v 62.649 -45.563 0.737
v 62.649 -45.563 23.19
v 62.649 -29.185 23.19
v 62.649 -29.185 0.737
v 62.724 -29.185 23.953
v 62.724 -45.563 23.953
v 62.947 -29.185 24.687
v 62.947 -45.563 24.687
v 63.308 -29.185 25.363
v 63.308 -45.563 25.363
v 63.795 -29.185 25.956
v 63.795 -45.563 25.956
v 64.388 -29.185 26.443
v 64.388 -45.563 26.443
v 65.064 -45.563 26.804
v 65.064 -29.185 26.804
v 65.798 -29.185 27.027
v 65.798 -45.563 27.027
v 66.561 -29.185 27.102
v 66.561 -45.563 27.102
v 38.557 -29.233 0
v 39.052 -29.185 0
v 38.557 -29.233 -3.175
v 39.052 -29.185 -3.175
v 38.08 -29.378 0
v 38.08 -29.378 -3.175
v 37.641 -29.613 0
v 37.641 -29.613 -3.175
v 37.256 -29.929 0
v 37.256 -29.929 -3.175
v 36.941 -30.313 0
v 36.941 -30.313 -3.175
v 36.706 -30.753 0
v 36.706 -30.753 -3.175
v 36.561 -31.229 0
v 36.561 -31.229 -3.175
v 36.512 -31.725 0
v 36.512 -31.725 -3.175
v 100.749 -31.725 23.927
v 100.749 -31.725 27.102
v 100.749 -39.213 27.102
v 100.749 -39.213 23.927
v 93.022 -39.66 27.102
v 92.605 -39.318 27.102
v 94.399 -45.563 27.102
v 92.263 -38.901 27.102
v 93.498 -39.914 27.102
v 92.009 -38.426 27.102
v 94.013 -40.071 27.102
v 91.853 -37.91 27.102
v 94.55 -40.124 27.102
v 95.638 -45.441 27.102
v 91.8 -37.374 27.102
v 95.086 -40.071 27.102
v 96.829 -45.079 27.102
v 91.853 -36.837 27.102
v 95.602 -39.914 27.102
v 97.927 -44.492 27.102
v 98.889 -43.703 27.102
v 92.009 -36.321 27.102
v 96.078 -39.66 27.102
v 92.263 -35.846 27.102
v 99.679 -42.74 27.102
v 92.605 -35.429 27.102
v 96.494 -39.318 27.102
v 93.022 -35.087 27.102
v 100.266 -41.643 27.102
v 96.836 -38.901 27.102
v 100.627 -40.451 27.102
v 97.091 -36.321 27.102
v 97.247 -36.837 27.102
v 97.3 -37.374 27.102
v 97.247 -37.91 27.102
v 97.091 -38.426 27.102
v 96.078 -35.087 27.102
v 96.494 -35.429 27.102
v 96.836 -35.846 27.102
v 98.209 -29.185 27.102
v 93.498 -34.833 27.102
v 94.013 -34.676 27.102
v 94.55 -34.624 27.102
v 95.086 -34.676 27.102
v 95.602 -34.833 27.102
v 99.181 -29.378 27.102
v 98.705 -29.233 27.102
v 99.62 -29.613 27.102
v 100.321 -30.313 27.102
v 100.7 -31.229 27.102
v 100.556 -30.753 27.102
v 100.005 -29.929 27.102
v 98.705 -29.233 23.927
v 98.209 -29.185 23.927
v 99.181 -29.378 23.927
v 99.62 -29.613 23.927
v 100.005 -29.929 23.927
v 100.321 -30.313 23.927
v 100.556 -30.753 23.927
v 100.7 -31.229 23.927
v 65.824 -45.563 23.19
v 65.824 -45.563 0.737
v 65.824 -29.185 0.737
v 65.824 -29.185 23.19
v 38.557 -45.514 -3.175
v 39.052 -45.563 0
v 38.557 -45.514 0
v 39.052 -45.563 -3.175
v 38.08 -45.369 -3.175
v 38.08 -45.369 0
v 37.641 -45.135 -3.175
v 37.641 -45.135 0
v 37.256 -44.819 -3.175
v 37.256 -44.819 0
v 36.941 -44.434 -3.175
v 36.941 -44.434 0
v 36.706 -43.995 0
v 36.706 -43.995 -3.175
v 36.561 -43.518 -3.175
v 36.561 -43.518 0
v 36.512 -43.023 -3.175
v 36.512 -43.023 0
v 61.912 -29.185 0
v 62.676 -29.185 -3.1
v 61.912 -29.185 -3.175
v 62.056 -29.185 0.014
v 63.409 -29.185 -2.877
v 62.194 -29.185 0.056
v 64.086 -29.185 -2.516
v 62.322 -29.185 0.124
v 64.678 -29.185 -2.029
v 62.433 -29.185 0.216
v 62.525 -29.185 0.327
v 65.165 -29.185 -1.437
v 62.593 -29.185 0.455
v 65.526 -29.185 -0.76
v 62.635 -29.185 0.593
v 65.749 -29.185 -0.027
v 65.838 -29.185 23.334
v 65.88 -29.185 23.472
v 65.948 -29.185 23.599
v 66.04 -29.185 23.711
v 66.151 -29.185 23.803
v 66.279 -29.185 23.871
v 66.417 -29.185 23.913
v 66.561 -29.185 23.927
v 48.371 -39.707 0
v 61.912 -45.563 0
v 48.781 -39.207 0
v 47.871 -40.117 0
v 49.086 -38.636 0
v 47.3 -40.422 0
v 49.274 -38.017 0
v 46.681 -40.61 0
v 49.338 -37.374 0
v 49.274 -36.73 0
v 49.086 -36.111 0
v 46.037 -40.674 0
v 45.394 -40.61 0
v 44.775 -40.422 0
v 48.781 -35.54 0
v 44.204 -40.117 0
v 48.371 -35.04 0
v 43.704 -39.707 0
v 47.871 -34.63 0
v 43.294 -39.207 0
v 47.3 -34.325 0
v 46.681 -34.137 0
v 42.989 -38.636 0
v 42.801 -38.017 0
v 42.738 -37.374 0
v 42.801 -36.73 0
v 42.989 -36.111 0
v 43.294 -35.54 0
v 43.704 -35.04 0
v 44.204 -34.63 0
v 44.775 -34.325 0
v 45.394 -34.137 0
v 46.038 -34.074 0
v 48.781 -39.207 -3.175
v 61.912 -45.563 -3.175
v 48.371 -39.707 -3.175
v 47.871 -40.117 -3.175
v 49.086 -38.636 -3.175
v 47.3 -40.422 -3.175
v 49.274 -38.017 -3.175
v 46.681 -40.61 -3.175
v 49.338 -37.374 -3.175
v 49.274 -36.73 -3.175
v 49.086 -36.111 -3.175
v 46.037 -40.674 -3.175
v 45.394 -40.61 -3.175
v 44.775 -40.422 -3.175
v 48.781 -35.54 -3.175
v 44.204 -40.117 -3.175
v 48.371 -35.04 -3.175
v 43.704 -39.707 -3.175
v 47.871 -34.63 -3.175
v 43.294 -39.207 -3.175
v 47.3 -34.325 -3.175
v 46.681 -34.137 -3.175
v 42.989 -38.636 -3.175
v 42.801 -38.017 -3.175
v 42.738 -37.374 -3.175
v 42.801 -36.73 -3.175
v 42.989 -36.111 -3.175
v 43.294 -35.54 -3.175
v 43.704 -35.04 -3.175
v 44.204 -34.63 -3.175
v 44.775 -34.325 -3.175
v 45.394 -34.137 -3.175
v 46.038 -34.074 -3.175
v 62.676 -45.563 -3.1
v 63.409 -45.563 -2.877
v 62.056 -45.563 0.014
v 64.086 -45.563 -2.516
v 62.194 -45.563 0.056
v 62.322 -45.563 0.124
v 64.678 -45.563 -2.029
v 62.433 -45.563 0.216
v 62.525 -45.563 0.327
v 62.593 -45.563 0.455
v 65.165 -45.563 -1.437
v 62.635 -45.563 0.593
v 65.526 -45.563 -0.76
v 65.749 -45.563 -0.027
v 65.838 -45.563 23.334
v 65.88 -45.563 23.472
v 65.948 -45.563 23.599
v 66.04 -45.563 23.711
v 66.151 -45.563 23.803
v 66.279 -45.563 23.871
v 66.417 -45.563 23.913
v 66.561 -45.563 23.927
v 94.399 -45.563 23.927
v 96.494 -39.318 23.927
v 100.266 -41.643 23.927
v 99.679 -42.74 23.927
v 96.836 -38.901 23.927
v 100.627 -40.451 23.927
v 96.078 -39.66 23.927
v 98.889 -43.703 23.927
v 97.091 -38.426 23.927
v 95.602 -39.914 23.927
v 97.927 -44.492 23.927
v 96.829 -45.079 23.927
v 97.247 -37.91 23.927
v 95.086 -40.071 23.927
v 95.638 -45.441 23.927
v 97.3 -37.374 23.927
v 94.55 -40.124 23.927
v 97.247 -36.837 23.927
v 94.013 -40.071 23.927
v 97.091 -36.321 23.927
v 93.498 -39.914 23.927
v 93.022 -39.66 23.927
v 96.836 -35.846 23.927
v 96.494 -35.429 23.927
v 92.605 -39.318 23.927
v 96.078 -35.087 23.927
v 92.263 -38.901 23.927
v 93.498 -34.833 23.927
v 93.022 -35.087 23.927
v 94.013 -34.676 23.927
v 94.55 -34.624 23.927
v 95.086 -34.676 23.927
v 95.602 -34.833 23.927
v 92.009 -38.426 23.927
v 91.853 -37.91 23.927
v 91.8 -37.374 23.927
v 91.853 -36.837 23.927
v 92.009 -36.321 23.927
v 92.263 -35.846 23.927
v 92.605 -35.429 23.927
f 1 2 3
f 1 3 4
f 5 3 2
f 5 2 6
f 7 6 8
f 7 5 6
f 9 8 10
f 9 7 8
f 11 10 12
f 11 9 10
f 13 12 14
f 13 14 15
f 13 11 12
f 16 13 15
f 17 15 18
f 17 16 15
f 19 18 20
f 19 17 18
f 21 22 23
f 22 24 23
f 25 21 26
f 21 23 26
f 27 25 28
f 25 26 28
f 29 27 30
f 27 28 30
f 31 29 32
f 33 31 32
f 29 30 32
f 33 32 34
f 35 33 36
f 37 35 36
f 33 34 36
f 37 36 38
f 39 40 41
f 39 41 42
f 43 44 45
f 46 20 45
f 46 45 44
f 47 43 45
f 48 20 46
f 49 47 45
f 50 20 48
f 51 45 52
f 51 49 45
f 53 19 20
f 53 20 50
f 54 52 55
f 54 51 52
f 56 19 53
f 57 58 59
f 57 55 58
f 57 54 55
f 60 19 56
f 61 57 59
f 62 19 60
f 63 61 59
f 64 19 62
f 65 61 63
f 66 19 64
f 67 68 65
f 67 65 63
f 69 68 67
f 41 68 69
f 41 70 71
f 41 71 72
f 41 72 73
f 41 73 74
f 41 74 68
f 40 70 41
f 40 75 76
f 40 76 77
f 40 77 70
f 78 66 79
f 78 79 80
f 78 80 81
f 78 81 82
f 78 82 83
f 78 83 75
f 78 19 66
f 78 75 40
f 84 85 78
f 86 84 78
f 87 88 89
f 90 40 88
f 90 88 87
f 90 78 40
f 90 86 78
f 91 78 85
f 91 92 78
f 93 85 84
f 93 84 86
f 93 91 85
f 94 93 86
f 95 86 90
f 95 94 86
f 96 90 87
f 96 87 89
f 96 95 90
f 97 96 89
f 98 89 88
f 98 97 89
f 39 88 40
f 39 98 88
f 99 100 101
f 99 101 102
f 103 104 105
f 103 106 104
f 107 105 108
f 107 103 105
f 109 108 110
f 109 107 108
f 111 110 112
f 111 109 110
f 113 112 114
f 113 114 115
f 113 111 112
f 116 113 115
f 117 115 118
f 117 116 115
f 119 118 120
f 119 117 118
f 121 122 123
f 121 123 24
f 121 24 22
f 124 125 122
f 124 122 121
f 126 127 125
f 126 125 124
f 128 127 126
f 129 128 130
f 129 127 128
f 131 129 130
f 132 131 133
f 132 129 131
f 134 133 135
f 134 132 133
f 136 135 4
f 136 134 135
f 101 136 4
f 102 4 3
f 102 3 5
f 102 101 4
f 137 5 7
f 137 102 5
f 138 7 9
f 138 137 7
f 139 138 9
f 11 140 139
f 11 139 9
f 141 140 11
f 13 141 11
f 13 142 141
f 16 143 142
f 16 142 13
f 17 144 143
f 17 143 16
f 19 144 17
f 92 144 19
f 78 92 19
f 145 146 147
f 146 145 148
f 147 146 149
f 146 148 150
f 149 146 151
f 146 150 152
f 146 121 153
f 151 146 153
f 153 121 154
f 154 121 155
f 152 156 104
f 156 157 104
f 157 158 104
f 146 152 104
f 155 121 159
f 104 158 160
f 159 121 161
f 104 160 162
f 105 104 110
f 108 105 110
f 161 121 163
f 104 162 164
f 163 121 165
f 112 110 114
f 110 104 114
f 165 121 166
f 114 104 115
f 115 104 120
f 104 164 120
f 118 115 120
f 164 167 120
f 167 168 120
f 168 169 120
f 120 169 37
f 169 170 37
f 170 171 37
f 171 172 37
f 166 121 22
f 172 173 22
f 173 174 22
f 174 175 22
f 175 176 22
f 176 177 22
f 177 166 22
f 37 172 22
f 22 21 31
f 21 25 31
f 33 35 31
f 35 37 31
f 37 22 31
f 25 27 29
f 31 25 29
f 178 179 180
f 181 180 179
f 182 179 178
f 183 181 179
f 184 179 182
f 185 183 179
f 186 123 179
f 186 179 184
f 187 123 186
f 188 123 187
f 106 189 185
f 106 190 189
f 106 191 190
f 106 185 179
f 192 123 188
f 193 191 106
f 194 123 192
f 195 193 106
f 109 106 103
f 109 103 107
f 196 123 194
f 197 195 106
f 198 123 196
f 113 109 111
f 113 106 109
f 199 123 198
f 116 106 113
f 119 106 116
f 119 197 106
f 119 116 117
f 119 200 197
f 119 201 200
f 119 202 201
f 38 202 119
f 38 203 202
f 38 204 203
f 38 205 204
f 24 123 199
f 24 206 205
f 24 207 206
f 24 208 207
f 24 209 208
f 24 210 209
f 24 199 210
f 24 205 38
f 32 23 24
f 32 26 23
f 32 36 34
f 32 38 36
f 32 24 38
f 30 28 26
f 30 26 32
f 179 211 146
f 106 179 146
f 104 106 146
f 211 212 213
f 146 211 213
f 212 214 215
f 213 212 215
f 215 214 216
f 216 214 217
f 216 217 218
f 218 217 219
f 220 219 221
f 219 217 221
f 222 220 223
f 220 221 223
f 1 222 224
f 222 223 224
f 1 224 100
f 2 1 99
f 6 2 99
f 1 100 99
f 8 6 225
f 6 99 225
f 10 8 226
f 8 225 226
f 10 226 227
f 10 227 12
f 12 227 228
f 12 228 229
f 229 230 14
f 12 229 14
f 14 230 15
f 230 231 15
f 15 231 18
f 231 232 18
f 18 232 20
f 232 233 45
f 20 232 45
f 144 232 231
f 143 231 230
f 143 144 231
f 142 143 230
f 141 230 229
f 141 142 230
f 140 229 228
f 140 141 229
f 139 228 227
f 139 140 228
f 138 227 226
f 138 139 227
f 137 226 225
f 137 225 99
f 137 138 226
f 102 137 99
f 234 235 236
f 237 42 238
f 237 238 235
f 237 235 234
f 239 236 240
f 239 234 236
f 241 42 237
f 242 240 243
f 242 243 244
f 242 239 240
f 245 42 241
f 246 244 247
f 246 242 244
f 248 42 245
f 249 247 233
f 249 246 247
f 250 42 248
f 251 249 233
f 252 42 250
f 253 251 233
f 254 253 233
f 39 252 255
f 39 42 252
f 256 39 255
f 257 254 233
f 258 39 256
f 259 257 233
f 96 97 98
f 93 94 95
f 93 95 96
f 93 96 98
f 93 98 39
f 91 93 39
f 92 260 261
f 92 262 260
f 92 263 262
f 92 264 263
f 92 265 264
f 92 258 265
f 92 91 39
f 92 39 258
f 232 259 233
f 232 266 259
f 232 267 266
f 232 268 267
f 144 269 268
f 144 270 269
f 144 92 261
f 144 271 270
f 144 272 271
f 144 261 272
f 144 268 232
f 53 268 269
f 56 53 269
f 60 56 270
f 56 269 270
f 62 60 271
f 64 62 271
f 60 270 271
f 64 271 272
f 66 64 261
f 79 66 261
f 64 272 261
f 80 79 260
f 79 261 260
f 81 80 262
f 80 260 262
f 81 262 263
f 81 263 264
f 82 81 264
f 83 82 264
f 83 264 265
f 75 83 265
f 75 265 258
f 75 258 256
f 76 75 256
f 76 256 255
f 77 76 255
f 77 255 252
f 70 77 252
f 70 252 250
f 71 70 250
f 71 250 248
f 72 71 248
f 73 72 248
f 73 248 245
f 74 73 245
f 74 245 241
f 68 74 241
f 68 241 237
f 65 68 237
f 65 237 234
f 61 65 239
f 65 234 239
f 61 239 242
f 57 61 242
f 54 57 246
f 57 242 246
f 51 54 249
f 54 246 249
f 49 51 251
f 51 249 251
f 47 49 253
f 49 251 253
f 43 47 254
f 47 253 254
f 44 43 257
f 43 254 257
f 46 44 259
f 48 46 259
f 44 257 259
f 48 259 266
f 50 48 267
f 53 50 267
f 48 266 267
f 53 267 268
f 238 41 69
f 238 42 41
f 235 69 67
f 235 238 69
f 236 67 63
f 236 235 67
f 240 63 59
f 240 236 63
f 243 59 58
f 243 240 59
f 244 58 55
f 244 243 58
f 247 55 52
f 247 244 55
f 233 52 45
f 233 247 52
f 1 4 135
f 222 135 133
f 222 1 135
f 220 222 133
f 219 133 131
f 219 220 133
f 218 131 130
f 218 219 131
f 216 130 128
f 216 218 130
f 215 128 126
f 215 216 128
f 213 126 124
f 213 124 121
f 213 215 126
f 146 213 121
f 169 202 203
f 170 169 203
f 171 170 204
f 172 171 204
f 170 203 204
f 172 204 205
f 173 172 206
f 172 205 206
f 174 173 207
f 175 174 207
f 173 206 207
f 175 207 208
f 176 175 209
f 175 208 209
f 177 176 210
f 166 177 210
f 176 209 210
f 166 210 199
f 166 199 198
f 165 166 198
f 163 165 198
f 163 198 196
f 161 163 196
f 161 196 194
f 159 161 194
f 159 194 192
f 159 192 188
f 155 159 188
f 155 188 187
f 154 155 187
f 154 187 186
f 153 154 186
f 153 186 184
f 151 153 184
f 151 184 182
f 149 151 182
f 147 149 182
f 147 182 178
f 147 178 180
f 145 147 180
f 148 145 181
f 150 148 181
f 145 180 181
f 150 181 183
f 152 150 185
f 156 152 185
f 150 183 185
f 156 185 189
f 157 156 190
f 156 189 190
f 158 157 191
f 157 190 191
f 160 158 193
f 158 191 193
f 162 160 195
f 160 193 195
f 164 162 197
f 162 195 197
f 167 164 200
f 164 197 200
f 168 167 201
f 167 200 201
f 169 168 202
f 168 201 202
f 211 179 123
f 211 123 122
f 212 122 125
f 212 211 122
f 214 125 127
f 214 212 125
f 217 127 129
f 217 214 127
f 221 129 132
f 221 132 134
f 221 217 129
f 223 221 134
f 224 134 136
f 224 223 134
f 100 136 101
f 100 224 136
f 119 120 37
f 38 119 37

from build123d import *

# Parameters (mm, degrees)
BASE_FLANGE1_DEPTH           = 3.175
M6_CLEARANCE_HOLE1_D         = 6.6
EDGE_FLANGE1_DEPTH           = 16.378
EDGE_FLANGE2_STRIP_W         = 14.1732
EDGE_FLANGE2_STRIP_H         = 3.175
EDGE_FLANGE2_STRIP_CUT_DEPTH = 16.378
EDGE_FLANGE2_DEPTH           = 16.378
M5_CLEARANCE_HOLE1_D         = 5.5
FILLET1_R                    = 2.54
FILLET2_R                    = 6.35


# Sheet-metal steps are written as plain solids
with BuildPart() as part:
    # Sketch1 → Base-Flange1 (new body)
    with BuildSketch(Plane.XY):
        Polygon((52.8905, -45.562600001), (36.5125, -45.562600001), (36.5125, -29.184600001), (61.9125, -29.184600001), (61.9125, -45.562600001), align=None)
    extrude(amount=-BASE_FLANGE1_DEPTH)

    # M6 Clearance Hole1 (through all)
    with Locations(Plane.XY):
        with Locations((46.0375, -37.373600001)):
            Hole(M6_CLEARANCE_HOLE1_D / 2)

    # Edge-Flange1 section (across the edge) → Edge-Flange1 (add)
    with BuildSketch(Plane(origin=(62.6491, -45.562600001, 0), x_dir=(-1, 0, 0), z_dir=(0, 1, 0))):
        with BuildLine():
            Line((-3.175, 0.7366), (-3.175, 23.9268))
            Line((-3.175, 23.9268), (0, 23.9268))
            Line((0, 23.9268), (0, 0.7366))
            ThreePointArc((0, 0.7366), (0.215745145, 0.215745145), (0.7366, 0))
            Line((0.7366, 0), (0.7366, -3.175))
            ThreePointArc((0.7366, -3.175), (-2.029318885, -2.029318885), (-3.175, 0.7366))
        make_face()
    extrude(amount=EDGE_FLANGE1_DEPTH)

    # Edge-Flange2 strip (across the edge) → Edge-Flange2 strip cut (cut)
    with BuildSketch(Plane(origin=(65.8241, -29.184600001, 23.9268), x_dir=(0, 0, -1), z_dir=(0, -1, 0))):
        with Locations((-6.35, -1.5875)):
            Rectangle(EDGE_FLANGE2_STRIP_W, EDGE_FLANGE2_STRIP_H)
    extrude(amount=EDGE_FLANGE2_STRIP_CUT_DEPTH, mode=Mode.SUBTRACT)

    # Edge-Flange2 section (across the edge) → Edge-Flange2 (add)
    with BuildSketch(Plane(origin=(65.8241, -29.184600001, 23.9268), x_dir=(0, 0, -1), z_dir=(0, -1, 0))):
        with BuildLine():
            Line((-3.175, 0.7366), (-3.175, 34.925))
            Line((-3.175, 34.925), (0, 34.925))
            Line((0, 34.925), (0, 0.7366))
            ThreePointArc((0, 0.7366), (0.215745145, 0.215745145), (0.7366, 0))
            Line((0.7366, 0), (0.7366, -3.175))
            ThreePointArc((0.7366, -3.175), (-2.029318885, -2.029318885), (-3.175, 0.7366))
        make_face()
    extrude(amount=EDGE_FLANGE2_DEPTH)

    # M5 Clearance Hole1 (through all)
    with Locations(Plane.XY.offset(27.1018)):
        with Locations((94.5499, -37.373600001)):
            Hole(M5_CLEARANCE_HOLE1_D / 2)

    # Fillet1
    fillet1_edges = [part.edges().sort_by_distance(p)[0] for p in [
        (100.7491, -29.184600001, 25.5143),
        (36.5125, -45.562600001, -1.5875),
        (36.5125, -29.184600001, -1.5875),
    ]]
    fillet(fillet1_edges, radius=FILLET1_R)

    # Fillet2
    fillet2_edges = [part.edges().sort_by_distance(p)[0] for p in [
        (100.7491, -45.562600001, 25.5143),
    ]]
    fillet(fillet2_edges, radius=FILLET2_R)


solid = part.part
